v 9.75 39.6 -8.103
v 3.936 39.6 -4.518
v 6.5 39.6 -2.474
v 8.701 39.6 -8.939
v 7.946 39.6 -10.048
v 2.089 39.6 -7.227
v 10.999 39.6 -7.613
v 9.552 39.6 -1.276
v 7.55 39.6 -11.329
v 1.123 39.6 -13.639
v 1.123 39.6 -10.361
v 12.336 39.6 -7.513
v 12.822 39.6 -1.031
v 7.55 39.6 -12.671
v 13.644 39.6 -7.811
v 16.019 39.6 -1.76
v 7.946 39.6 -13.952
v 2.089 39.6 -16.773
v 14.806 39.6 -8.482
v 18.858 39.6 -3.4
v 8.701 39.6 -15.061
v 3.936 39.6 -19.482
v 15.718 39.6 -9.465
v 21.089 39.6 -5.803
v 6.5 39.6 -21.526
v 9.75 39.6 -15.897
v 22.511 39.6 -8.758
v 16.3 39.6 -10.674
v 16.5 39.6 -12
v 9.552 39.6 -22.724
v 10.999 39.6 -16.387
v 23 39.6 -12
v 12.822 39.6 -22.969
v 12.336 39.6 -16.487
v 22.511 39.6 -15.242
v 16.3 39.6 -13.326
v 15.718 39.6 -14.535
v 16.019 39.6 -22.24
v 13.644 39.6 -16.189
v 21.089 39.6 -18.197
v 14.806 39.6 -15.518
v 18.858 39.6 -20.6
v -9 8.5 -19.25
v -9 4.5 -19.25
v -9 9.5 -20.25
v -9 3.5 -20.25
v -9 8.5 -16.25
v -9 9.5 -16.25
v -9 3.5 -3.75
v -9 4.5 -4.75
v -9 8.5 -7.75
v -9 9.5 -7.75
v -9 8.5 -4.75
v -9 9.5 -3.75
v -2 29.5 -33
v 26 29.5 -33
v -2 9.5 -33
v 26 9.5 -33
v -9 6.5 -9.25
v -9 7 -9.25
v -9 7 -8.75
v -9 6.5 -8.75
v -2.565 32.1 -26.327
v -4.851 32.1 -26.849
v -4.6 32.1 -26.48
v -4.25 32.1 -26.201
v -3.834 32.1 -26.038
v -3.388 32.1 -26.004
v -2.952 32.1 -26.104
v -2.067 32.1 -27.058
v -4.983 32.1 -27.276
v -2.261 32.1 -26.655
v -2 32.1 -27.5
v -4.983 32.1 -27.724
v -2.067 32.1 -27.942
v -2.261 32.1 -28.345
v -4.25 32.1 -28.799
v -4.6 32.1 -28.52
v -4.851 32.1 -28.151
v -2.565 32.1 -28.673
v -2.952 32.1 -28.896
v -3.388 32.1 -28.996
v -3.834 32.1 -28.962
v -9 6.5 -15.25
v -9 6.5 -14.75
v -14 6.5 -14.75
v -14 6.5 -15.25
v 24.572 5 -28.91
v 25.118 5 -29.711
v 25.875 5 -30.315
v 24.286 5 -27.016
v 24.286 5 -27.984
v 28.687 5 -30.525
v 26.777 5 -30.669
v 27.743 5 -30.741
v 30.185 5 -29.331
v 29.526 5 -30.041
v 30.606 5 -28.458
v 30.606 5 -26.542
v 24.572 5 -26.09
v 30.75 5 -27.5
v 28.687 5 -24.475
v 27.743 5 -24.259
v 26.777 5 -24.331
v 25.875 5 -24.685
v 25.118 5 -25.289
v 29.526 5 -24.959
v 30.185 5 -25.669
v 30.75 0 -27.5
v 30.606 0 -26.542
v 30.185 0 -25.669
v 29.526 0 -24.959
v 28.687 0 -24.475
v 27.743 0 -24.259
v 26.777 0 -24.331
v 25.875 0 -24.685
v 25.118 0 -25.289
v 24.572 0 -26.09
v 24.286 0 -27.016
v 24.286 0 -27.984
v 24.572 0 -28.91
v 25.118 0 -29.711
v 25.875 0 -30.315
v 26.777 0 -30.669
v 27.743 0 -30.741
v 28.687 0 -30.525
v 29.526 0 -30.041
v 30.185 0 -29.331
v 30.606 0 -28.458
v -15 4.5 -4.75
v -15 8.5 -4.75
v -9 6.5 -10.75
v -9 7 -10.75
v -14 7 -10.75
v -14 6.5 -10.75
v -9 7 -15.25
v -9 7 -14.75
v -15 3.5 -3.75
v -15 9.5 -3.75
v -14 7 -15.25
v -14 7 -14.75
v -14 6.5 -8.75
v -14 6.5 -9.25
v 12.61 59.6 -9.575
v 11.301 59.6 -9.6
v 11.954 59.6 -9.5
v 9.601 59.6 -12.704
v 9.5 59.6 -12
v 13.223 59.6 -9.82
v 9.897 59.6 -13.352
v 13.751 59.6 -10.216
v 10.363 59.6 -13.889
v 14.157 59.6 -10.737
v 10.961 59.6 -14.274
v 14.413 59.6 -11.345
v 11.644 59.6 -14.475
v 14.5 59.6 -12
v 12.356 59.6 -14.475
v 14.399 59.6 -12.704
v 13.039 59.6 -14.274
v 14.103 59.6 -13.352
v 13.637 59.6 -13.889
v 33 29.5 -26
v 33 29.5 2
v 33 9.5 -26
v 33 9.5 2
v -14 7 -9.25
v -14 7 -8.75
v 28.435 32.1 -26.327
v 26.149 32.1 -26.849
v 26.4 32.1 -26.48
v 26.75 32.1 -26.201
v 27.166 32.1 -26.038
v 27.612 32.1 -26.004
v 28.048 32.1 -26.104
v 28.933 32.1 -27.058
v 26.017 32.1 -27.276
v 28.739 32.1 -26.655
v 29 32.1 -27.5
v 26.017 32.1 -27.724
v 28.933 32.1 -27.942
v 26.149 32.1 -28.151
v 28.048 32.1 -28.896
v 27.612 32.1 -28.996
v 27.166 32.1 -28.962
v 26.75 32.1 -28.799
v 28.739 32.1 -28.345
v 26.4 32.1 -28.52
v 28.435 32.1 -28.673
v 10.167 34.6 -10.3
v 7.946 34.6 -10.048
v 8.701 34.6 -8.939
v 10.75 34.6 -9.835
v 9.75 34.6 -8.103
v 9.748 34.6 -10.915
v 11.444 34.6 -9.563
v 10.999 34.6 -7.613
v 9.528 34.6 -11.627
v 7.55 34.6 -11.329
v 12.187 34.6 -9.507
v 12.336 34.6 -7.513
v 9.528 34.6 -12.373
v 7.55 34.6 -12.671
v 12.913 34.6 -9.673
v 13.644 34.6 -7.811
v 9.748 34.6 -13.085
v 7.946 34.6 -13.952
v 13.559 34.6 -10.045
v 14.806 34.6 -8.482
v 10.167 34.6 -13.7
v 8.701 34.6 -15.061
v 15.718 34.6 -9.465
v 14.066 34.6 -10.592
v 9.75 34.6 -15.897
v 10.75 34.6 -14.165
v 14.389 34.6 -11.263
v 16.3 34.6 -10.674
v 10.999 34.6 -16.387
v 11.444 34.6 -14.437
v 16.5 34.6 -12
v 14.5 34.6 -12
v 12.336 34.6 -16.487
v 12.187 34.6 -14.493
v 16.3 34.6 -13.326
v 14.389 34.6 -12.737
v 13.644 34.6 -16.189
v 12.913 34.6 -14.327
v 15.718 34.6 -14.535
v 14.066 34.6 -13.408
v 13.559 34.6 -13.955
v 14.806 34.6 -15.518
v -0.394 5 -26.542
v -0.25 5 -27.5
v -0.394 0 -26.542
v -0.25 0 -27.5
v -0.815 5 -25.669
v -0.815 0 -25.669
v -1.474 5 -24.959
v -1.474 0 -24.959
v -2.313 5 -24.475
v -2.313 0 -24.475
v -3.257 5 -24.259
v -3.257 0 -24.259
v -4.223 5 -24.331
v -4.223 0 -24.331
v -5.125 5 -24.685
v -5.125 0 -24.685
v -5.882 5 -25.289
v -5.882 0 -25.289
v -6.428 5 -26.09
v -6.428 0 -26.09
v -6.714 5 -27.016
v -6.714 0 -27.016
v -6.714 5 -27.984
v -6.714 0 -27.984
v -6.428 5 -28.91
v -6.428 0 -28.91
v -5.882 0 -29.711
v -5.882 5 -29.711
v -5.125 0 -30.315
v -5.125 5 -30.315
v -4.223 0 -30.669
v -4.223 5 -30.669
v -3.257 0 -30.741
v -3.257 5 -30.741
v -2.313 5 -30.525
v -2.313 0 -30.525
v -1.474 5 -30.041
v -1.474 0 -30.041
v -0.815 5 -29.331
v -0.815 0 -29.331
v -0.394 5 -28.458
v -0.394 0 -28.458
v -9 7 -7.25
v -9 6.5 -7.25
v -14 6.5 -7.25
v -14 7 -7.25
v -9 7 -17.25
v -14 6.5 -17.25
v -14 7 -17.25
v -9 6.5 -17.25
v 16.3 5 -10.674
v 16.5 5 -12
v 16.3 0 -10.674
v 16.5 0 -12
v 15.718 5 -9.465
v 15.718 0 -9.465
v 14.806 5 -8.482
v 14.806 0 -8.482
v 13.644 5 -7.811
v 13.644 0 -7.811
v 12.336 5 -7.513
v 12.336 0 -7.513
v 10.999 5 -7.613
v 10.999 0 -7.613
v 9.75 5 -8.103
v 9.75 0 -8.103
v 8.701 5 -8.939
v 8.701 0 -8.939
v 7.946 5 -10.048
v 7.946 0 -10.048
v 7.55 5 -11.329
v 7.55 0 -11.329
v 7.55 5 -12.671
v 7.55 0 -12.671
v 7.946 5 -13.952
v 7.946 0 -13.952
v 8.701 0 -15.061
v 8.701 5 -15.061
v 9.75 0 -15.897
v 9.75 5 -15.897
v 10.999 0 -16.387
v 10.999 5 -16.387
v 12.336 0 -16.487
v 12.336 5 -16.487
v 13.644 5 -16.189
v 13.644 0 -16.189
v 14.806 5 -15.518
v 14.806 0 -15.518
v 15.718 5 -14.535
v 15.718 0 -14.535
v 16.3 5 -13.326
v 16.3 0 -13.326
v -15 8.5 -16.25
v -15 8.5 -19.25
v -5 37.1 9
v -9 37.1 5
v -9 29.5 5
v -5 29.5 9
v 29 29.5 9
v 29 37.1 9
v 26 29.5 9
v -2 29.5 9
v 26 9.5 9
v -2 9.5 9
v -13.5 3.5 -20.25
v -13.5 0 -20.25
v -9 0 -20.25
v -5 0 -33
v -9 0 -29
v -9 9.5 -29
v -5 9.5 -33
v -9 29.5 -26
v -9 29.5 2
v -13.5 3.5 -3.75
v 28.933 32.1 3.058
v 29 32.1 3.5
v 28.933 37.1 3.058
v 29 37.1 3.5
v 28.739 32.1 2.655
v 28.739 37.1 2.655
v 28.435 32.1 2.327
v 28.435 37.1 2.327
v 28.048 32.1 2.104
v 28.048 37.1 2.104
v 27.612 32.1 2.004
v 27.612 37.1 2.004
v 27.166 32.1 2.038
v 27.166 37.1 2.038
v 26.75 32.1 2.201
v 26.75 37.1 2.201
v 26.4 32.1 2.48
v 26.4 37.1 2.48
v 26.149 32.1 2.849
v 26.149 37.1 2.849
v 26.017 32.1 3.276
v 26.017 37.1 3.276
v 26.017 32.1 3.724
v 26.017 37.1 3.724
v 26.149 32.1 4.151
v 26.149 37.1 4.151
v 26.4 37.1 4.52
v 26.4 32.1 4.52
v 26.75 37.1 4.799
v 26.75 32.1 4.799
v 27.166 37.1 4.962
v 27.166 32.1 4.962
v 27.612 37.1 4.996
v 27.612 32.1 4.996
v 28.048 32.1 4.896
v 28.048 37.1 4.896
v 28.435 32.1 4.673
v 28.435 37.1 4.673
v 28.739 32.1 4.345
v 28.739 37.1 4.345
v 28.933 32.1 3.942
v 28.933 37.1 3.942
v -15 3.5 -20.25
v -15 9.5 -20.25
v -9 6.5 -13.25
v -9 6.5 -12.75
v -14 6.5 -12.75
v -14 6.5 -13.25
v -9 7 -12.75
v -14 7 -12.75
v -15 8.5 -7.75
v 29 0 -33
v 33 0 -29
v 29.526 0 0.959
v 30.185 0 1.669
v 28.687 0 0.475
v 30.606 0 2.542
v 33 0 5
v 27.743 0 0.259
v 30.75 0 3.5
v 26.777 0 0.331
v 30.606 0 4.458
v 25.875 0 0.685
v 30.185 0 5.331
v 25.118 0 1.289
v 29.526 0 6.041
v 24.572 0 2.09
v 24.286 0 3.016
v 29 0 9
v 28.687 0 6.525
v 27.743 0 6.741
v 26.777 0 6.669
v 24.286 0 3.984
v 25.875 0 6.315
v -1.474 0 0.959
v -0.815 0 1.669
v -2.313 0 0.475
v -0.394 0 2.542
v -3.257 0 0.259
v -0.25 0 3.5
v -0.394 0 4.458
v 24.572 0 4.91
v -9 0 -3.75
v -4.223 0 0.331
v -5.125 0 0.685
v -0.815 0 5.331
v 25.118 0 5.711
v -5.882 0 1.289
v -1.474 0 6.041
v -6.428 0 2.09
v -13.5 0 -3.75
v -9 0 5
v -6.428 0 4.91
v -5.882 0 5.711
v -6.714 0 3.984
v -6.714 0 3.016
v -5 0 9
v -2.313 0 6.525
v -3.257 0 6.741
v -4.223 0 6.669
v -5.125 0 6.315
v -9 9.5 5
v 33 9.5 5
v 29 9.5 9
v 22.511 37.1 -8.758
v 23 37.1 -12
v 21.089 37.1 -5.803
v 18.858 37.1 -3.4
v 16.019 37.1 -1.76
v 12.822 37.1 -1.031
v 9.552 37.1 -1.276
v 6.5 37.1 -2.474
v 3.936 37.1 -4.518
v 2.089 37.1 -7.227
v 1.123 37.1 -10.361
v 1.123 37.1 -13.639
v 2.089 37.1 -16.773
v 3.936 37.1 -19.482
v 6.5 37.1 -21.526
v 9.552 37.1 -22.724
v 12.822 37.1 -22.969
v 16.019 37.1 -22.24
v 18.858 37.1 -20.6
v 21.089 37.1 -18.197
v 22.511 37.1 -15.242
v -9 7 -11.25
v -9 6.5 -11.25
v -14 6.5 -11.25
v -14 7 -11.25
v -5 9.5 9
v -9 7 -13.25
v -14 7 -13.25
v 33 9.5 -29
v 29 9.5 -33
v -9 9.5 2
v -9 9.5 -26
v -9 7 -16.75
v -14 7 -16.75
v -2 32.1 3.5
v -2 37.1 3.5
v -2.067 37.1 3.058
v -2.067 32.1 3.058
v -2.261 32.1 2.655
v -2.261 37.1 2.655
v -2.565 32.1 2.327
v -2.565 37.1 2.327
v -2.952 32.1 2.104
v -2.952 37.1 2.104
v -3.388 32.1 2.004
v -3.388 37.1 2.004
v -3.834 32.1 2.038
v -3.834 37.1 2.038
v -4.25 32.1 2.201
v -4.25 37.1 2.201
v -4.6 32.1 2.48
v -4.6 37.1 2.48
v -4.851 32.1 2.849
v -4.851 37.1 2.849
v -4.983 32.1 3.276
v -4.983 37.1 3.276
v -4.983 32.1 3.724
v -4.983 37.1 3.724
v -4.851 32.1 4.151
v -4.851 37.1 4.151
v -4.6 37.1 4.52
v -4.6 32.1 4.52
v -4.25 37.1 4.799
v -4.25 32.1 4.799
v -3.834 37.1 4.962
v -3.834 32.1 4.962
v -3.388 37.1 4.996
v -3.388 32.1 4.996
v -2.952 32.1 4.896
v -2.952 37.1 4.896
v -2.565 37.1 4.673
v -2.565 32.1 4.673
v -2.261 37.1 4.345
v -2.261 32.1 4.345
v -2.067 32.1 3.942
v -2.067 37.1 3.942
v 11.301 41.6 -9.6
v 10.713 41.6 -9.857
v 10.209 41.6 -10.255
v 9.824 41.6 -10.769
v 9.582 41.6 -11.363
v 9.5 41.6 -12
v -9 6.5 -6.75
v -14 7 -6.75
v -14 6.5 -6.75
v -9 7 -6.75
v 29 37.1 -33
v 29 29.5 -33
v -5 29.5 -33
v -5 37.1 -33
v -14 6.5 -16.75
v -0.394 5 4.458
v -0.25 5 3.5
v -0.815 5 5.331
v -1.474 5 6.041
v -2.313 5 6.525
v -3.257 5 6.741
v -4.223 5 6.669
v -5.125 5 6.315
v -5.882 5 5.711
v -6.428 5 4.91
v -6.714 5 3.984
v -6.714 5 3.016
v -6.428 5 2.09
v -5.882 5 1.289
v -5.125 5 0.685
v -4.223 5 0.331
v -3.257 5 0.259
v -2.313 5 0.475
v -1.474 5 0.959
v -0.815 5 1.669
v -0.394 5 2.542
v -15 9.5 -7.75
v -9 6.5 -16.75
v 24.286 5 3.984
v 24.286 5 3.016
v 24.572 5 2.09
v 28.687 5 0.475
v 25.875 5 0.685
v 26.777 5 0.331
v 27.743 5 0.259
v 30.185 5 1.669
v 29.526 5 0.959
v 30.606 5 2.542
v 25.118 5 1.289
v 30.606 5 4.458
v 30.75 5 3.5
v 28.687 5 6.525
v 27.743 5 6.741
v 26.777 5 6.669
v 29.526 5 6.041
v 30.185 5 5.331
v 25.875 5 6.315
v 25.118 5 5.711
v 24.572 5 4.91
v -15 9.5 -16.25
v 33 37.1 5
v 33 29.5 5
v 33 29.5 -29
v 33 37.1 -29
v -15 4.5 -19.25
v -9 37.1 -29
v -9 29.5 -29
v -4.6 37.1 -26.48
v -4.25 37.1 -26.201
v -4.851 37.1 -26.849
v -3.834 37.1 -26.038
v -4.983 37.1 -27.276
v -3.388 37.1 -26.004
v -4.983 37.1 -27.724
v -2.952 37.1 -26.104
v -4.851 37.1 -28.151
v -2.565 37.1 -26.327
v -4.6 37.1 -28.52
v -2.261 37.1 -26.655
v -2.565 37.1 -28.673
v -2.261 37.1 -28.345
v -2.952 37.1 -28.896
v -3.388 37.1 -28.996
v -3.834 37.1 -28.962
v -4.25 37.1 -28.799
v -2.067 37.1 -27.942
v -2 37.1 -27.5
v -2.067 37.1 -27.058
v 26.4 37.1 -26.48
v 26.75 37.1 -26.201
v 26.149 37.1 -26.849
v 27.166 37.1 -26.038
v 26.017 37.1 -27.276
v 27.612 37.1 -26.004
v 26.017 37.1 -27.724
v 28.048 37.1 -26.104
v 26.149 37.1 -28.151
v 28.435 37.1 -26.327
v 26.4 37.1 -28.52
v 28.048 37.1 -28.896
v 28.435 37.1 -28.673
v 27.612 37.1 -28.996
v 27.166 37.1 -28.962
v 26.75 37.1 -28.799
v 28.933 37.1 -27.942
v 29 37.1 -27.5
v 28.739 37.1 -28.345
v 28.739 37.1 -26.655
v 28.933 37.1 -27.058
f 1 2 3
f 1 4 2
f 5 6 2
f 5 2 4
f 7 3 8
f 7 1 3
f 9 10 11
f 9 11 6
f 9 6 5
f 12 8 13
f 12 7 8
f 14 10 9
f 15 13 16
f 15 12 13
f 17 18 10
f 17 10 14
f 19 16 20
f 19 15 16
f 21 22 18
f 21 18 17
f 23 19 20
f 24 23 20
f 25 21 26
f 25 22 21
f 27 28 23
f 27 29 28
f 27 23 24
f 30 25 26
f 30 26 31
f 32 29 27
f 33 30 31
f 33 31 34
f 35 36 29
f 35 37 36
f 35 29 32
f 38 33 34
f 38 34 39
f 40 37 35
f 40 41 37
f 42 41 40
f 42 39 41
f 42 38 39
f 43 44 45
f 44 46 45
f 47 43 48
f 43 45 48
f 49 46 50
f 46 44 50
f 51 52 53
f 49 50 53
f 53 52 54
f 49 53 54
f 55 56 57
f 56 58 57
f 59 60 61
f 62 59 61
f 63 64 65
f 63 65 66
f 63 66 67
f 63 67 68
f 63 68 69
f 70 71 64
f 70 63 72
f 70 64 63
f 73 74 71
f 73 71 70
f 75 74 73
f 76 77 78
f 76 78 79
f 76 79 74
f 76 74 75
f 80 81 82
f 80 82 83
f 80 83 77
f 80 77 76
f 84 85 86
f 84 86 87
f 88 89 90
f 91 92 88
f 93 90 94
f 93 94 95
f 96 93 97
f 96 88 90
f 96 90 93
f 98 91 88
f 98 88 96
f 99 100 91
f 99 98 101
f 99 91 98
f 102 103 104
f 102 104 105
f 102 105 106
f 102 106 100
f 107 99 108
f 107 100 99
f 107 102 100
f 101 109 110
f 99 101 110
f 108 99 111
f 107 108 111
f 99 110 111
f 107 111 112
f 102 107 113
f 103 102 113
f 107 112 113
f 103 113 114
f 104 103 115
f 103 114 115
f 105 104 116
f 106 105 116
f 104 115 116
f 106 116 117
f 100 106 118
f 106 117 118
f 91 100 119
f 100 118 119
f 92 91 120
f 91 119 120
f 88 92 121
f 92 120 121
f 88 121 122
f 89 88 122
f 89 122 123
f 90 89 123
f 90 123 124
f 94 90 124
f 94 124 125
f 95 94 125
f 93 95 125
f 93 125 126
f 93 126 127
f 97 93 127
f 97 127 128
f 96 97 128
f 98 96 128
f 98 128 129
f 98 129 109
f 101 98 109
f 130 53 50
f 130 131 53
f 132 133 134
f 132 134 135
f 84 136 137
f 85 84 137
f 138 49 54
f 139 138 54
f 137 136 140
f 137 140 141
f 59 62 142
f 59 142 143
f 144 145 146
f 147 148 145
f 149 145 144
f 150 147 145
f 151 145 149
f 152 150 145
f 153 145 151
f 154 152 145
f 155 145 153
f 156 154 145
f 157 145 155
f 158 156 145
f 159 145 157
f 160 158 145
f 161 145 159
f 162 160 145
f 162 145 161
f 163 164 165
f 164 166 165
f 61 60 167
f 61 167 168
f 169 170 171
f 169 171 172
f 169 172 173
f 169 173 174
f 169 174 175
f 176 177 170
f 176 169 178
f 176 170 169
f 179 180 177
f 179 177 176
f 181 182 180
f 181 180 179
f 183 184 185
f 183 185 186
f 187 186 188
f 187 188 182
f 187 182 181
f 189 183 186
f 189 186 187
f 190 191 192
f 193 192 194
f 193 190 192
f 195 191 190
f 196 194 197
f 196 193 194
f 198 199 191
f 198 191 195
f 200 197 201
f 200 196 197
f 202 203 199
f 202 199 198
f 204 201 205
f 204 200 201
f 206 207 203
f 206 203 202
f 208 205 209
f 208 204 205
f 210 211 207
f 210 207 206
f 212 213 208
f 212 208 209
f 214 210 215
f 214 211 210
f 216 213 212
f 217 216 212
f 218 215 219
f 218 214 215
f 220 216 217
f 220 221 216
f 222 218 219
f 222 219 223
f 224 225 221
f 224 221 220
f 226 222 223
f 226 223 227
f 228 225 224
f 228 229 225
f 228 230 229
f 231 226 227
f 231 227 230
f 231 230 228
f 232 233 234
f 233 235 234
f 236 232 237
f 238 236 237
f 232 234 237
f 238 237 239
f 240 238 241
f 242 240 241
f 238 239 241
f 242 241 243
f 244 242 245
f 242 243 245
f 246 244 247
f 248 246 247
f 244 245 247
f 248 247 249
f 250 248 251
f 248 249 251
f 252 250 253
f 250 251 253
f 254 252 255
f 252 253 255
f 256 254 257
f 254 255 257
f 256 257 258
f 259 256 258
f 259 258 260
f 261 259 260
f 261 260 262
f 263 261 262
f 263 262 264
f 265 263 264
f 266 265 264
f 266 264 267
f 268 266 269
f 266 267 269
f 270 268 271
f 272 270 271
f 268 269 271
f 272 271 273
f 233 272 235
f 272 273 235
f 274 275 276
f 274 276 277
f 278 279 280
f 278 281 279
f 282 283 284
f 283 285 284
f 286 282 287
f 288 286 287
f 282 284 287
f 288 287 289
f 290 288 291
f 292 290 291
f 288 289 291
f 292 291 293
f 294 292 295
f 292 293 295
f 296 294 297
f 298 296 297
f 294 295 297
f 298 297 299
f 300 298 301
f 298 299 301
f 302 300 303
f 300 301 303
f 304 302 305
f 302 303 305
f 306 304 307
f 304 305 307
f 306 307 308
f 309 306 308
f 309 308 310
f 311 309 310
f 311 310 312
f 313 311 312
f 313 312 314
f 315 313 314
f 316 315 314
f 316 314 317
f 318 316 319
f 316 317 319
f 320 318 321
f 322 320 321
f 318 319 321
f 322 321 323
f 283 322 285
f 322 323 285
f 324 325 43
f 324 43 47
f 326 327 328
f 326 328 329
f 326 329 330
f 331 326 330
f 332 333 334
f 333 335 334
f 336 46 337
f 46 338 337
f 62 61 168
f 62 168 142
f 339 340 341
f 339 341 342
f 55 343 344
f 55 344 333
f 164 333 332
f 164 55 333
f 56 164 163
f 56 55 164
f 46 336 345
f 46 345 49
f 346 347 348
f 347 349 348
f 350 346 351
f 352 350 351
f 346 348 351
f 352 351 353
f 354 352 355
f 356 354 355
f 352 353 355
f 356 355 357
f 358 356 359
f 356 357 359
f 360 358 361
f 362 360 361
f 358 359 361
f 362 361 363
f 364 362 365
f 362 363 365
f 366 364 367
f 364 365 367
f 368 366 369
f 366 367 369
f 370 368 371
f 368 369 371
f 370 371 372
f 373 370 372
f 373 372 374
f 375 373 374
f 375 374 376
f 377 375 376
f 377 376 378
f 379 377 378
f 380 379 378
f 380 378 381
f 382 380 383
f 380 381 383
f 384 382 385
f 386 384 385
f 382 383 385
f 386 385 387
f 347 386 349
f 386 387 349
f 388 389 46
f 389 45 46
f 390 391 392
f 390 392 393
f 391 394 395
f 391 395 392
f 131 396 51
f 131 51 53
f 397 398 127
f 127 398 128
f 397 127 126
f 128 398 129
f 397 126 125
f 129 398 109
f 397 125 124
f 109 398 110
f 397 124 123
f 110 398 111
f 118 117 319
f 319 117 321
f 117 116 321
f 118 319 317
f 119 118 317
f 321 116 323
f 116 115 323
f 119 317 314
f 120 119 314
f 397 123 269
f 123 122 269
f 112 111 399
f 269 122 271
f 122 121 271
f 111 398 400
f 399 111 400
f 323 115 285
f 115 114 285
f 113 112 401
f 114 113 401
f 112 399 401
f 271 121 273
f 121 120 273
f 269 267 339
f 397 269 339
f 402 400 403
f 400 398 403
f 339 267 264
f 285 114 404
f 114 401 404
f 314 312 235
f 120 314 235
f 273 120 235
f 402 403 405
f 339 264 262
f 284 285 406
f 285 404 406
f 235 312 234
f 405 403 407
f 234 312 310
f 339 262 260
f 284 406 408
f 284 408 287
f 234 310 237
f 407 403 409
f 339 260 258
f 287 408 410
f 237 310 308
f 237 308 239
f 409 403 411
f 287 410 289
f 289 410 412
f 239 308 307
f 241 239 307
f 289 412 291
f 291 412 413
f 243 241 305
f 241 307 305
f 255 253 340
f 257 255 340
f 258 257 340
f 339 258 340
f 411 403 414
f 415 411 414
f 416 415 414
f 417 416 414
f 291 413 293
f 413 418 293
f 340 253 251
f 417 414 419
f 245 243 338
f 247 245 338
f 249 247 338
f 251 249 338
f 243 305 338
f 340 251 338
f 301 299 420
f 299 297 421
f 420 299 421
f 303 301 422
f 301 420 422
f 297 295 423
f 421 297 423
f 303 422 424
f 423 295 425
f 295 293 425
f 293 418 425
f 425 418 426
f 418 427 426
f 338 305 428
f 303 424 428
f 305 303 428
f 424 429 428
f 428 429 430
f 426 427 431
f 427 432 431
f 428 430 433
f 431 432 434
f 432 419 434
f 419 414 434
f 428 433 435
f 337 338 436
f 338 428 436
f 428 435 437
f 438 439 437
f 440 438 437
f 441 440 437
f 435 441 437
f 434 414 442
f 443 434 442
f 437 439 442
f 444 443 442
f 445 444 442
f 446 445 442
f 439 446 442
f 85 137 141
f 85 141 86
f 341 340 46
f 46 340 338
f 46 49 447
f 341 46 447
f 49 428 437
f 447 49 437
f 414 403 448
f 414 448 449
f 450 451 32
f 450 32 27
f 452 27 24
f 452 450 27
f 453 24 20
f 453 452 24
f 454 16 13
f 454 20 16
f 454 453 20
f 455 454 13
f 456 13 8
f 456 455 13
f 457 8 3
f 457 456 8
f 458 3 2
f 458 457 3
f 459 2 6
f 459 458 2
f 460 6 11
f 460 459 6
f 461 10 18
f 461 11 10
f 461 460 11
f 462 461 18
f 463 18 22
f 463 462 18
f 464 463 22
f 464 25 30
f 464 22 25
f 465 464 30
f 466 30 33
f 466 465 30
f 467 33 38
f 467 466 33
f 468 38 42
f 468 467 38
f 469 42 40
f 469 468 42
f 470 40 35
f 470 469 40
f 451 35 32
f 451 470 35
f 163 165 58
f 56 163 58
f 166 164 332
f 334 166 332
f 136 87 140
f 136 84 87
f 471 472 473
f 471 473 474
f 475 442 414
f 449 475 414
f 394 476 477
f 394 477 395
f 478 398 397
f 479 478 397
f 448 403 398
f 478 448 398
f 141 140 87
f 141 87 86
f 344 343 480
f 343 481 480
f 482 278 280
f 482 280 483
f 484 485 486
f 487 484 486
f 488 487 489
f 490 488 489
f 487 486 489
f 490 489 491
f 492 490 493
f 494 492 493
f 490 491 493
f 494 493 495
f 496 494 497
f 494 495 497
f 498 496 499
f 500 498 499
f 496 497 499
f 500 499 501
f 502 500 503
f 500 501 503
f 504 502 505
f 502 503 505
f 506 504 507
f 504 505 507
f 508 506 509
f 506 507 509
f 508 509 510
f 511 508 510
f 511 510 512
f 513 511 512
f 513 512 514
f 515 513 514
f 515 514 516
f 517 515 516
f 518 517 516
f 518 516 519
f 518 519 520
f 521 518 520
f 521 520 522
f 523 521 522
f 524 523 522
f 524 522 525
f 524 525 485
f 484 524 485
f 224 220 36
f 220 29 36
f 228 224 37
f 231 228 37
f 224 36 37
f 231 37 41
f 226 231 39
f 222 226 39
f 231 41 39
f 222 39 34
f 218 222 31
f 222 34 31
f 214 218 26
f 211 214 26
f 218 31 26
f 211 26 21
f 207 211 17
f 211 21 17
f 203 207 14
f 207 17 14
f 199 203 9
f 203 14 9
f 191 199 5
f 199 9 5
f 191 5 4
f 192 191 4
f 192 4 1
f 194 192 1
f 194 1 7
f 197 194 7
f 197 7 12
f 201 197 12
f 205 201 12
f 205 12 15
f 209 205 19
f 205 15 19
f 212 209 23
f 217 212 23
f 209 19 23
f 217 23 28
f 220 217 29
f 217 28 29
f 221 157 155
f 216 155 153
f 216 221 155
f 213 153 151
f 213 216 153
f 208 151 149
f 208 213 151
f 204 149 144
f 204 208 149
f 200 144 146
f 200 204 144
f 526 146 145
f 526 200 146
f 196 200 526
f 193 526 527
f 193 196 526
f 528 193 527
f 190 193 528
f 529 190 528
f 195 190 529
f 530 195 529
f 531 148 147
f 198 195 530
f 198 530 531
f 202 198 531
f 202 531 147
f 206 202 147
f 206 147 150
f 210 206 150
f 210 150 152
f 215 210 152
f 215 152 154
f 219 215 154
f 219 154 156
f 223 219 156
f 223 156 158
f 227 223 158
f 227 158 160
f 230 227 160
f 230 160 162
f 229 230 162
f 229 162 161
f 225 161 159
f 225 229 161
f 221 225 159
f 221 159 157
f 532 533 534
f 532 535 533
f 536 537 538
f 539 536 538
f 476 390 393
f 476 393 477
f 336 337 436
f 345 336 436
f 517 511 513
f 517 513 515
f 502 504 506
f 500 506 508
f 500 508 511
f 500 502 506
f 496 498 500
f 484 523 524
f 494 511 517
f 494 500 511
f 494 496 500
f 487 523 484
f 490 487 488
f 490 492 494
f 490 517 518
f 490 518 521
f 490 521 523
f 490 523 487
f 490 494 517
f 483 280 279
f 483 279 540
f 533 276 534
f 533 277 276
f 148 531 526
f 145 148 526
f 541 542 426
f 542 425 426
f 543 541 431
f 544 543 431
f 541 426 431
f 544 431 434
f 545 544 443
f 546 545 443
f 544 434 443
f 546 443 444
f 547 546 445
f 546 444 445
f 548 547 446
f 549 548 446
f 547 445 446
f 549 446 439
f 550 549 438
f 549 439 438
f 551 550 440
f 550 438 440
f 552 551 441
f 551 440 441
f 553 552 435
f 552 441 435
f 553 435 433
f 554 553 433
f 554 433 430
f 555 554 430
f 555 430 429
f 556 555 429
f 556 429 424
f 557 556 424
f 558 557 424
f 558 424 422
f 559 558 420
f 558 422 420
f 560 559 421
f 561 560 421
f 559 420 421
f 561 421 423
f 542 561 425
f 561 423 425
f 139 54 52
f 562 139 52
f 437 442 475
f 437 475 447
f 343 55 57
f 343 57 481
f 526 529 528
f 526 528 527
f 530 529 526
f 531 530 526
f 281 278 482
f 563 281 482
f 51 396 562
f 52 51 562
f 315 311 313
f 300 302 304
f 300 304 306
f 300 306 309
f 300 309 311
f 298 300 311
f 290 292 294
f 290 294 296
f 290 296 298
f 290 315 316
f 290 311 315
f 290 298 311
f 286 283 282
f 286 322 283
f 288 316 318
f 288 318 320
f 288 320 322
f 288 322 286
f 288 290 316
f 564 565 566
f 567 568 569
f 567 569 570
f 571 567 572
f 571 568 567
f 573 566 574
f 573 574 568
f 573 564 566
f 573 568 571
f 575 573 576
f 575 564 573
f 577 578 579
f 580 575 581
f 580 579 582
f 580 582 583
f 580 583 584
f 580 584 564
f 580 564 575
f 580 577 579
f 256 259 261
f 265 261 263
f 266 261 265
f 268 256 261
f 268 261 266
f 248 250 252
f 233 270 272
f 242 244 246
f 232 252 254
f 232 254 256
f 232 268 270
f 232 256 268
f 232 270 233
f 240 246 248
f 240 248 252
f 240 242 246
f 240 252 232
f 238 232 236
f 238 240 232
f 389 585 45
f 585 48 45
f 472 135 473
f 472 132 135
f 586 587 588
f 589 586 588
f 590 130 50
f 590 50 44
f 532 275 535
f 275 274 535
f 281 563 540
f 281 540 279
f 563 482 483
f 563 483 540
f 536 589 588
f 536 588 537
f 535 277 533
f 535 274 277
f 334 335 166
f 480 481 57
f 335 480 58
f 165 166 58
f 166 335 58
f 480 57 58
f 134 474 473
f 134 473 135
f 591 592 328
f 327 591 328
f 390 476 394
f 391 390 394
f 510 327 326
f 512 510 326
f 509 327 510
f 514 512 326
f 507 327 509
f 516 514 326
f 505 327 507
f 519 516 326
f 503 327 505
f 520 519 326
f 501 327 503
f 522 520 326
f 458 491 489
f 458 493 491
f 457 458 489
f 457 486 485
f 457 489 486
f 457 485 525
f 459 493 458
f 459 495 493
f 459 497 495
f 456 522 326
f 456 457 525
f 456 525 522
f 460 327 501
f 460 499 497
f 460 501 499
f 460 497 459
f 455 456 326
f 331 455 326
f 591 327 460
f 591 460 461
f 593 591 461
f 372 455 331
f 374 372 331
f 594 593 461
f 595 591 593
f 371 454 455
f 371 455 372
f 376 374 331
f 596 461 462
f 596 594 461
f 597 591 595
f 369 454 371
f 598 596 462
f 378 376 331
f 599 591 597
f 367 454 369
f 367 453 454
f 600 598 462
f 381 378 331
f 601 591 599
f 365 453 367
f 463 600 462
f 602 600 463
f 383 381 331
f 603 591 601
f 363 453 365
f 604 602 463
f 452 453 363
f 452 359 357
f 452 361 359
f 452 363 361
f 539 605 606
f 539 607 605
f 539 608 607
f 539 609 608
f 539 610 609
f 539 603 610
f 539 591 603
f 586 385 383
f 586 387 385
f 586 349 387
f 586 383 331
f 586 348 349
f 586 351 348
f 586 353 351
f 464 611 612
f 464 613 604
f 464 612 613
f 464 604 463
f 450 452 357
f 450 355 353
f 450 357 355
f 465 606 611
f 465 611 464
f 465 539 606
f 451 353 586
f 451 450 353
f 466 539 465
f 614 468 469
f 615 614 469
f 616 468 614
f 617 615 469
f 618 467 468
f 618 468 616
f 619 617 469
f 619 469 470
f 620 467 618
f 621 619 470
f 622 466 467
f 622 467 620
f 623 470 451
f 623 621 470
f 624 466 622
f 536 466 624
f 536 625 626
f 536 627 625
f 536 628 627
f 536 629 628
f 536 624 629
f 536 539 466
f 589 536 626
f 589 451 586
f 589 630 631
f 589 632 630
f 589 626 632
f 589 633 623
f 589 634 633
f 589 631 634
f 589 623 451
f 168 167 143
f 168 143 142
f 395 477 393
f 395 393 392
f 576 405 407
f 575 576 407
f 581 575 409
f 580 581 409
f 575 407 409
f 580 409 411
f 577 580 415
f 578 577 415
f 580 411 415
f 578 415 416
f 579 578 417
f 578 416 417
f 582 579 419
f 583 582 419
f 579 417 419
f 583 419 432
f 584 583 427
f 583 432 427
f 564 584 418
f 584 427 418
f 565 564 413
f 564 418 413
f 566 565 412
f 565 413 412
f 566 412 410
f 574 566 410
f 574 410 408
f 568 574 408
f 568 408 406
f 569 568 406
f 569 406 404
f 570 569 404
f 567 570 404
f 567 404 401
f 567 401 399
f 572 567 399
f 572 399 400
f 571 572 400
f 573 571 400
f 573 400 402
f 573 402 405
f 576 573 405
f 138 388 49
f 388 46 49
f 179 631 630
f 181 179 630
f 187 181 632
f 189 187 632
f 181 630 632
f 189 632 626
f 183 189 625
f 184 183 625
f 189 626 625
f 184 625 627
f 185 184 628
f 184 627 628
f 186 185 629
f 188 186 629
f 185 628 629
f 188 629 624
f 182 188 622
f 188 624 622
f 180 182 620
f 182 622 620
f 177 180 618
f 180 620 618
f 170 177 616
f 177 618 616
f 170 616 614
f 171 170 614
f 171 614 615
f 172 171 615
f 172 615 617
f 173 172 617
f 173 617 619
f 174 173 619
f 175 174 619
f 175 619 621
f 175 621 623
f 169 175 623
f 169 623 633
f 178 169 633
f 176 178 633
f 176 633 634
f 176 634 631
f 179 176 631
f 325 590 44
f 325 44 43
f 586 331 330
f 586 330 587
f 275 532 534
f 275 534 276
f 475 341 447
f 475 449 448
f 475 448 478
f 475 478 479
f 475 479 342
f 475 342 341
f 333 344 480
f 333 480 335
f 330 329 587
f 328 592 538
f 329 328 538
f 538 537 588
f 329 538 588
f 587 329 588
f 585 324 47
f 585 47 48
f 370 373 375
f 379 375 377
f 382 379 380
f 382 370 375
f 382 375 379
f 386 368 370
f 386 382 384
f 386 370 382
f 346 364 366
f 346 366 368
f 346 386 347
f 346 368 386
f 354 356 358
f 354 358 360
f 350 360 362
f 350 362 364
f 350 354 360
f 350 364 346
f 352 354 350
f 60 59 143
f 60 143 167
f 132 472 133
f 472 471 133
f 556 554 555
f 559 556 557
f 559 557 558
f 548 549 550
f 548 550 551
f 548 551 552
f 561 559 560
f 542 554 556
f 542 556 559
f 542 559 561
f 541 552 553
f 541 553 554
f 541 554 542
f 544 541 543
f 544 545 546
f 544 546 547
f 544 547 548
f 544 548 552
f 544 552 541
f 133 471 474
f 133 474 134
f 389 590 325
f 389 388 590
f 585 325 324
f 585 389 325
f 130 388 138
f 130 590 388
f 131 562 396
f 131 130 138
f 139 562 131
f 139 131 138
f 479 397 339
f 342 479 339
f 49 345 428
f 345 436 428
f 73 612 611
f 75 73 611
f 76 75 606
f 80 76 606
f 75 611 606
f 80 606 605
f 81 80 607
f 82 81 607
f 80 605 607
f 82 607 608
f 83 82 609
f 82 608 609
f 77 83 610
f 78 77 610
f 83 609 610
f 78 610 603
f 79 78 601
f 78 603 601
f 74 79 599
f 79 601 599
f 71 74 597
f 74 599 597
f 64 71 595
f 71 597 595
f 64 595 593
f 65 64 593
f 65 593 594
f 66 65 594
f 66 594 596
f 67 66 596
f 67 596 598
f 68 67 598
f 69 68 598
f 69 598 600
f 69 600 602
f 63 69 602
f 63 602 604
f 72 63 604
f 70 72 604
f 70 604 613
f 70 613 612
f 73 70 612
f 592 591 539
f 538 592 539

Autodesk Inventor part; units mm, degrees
ref_plane "YZ Plane" through (0, 0, 0) normal (1, 0, 0) x (0, 1, 0)
ref_plane "XZ Plane" through (0, 0, 0) normal (0, 1, 0) x (-1, 0, 0)
ref_plane "XY Plane" through (0, 0, 0) normal (0, 0, 1) x (1, 0, 0)
sketch "Эскиз1" plane through (0, 0, 0) normal (0, 1, 0) x (-1, 0, 0)
  line L0 (9, 9) -> (-33, 9)
  line L1 (-33, 9) -> (-33, -33)
  line L2 (-33, -33) -> (9, -33)
  line L3 (9, -33) -> (9, 9)
  line L4 (9, -29) -> (5, -33)
  line L5 (9, 9) -> (-33, -33) construction
  line L6 (9, -33) -> (-33, 9) construction
  line L7 (5, 9) -> (9, 5)
  line L8 (-33, 5) -> (-29, 9)
  line L9 (-33, -29) -> (-29, -33)
  line L10 (13.5, -3.75) -> (9, -3.75)
  line L11 (9, -20.25) -> (13.5, -20.25)
  line L12 (13.5, -20.25) -> (13.5, -3.75)
  point P0 (0, 0)
  dimension "d0" = 42
  dimension "d1" = 42
  dimension "d2" = 4
  dimension "d3" = 4
  dimension "d17" = 12.75
  dimension "d18" = 16.5
  dimension "d19" = 4.5
extrude "Выдавливание1" add sketch "Эскиз1" along normal blind 9.5 contours L7 L3 L4 L2 L9 L1 L8 L0 | L10 L12 L11 L3
sketch "Эскиз2" plane through (0, 0, 0) normal (0, -1, 0) x (1, 0, 0)
  line L0 (-9, -33) -> (33, -33)
  line L1 (33, -33) -> (33, 9)
  line L2 (33, 9) -> (-9, 9)
  line L3 (-9, 9) -> (-9, -33)
  line L4 (-9, -33) -> (33, 9) construction
  line L5 (33, -33) -> (-9, 9) construction
  circle A0 centre (12, -12) radius 4.5
  circle A1 centre (-3.5, -27.5) radius 3.25
  circle A2 centre (-3.5, 3.5) radius 3.25
  circle A3 centre (27.5, 3.5) radius 3.25
  circle A4 centre (27.5, -27.5) radius 3.25
  line L6 (33, 5) -> (33, -29) projected
  line L7 (-5, 9) -> (29, 9) projected
  line L8 (29, -33) -> (-5, -33) projected
  line L9 (-9, -3.75) -> (-9, 5) projected
  point P0 (0, 0)
  dimension "d22" = 9
  dimension "d23" = 6.5
  dimension "d25" = 5.5
  dimension "d28" = 360
extrude "Выдавливание2" cut sketch "Эскиз2" against normal blind 5 contours A0 | A1 | A2 | A3 | A4
sketch "Эскиз3" plane through (0, 9.5, 0) normal (0, 1, 0) x (1, 0, 0)
  line L0 (-13.5, 3.75) -> (-9, 3.75) projected
  line L1 (-13.5, 3.75) -> (-9, 3.75)
  line L2 (-9, 3.75) -> (-9, 20.25)
  line L3 (-9, 20.25) -> (-13.5, 20.25)
  line L4 (-13.5, 20.25) -> (-13.5, 3.75)
  point P0 (0, 0)
extrude "Выдавливание3" cut sketch "Эскиз3" against normal blind 6
sketch "Эскиз4" plane through (-9, 0, -29) normal (-1, 0, 0) x (0, 0, 1)
  line L0 (8.75, 3.5) -> (25.25, 3.5) projected
  line L1 (8.75, 3.5) -> (25.25, 3.5)
  line L2 (25.25, 3.5) -> (25.25, 9.5)
  line L3 (25.25, 9.5) -> (8.75, 9.5)
  line L4 (8.75, 9.5) -> (8.75, 3.5)
  point P0 (29, 0)
  dimension "d34" = 16.5
  dimension "d35" = 6
extrude "Выдавливание4" add sketch "Эскиз4" along normal blind 6 separate body
sketch "Эскиз5" plane through (-15, 0, -29) normal (-1, 0, 0) x (0, 0, 1)
  line L0 (25.25, 9.5) -> (8.75, 9.5) projected
  line L1 (25.25, 3.5) -> (8.75, 3.5) projected
  line L2 (8.75, 9.5) -> (25.25, 9.5)
  line L3 (25.25, 9.5) -> (25.25, 3.5)
  line L4 (25.25, 3.5) -> (8.75, 3.5)
  line L5 (8.75, 3.5) -> (8.75, 9.5)
  line L6 (9.75, 8.5) -> (12.75, 8.5)
  line L7 (24.25, 8.5) -> (24.25, 4.5)
  line L8 (24.25, 4.5) -> (9.75, 4.5)
  line L9 (9.75, 4.5) -> (9.75, 8.5)
  line L10 (12.75, 8.5) -> (12.75, 9.5)
  line L11 (21.25, 8.5) -> (21.25, 9.5)
  line L12 (0, 9.5) -> (34, 9.5) projected
  line L13 (21.25, 8.5) -> (24.25, 8.5)
  point P0 (29, 0)
  dimension "d38" = 1
  dimension "d39" = 4
  dimension "d40" = 4
extrude "Выдавливание5" cut sketch "Эскиз5" against normal blind 6 contours L11 L13 L7 L8 L9 L6 L10 L0 bodies 2
sketch "Эскиз6" plane through (-9, 0, -29) normal (-1, 0, 0) x (0, 0, 1)
  line L0 (11.75, 7) -> (12.25, 7)
  line L1 (12.25, 7) -> (12.25, 6.5)
  line L2 (12.25, 6.5) -> (11.75, 6.5)
  line L3 (11.75, 6.5) -> (11.75, 7)
  line L4 (13.75, 7) -> (14.25, 7)
  line L5 (14.25, 7) -> (14.25, 6.5)
  line L6 (14.25, 6.5) -> (13.75, 6.5)
  line L7 (13.75, 6.5) -> (13.75, 7)
  line L8 (15.75, 7) -> (16.25, 7)
  line L9 (16.25, 7) -> (16.25, 6.5)
  line L10 (16.25, 6.5) -> (15.75, 6.5)
  line L11 (15.75, 6.5) -> (15.75, 7)
  line L12 (17.75, 7) -> (18.25, 7)
  line L13 (18.25, 7) -> (18.25, 6.5)
  line L14 (18.25, 6.5) -> (17.75, 6.5)
  line L15 (17.75, 6.5) -> (17.75, 7)
  line L16 (19.75, 7) -> (20.25, 7)
  line L17 (20.25, 7) -> (20.25, 6.5)
  line L18 (20.25, 6.5) -> (19.75, 6.5)
  line L19 (19.75, 6.5) -> (19.75, 7)
  line L20 (21.75, 7) -> (22.25, 7)
  line L21 (22.25, 7) -> (22.25, 6.5)
  line L22 (22.25, 6.5) -> (21.75, 6.5)
  line L23 (21.75, 6.5) -> (21.75, 7)
  line L24 (8.75, 0) -> (8.75, 3.5) projected
  point P0 (29, 0)
  dimension "d43" = 0.5
  dimension "d44" = 0.5
  dimension "d47" = 2
  dimension "d52" = 3
extrude "Выдавливание6" add sketch "Эскиз6" along normal blind 5 separate body
sketch "Эскиз7" plane through (0, 9.5, 0) normal (0, 1, 0) x (1, 0, 0)
  line L0 (33, 33) -> (-9, 33)
  line L1 (-9, 33) -> (-9, -9)
  line L2 (-9, -9) -> (33, -9)
  line L3 (33, -9) -> (33, 33)
  line L4 (33, -2) -> (26, -9)
  line L5 (33, -5) -> (33, 29) projected
  line L6 (-5, -9) -> (29, -9) projected
  line L7 (-9, 29) -> (-9, -5) projected
  line L8 (-9, -2) -> (-2, -9)
  line L9 (-2, 33) -> (-9, 26)
  line L10 (33, 26) -> (26, 33)
  line L11 (29, 33) -> (-5, 33) projected
  point P0 (0, 0)
  point P1 (33, 12)
  point P2 (12, -9)
  point P3 (-2, -9)
  dimension "d56" = 7
  dimension "d57" = 42
  dimension "d58" = 42
  dimension "d59" = 7
extrude "Выдавливание7" add sketch "Эскиз7" along normal blind 20 separate body contours L10 L3 L4 L2 L8 L1 L9 L0
sketch "Эскиз8" plane through (0, 29.5, 0) normal (0, 1, 0) x (1, 0, 0)
  line L0 (33, 33) -> (-9, 33)
  line L1 (-9, 33) -> (-9, -9)
  line L2 (-9, -9) -> (33, -9)
  line L3 (33, -9) -> (33, 33)
  line L4 (33, 29) -> (29, 33)
  line L5 (29, -9) -> (33, -5)
  line L6 (-9, -5) -> (-5, -9)
  line L7 (-9, 29) -> (-5, 33)
  point P0 (0, 0)
  dimension "d62" = 42
  dimension "d63" = 42
  dimension "d64" = 4
  dimension "d65" = 4
extrude "Выдавливание8" add sketch "Эскиз8" along normal blind 7.6 contours L4 L3 L5 L2 L6 L1 L7 L0 bodies 1
sketch "Эскиз9" plane through (0, 37.1, 0) normal (0, 1, 0) x (1, 0, 0)
  line L0 (33, -9) -> (-9, -9)
  line L1 (-9, -9) -> (-9, 33)
  line L2 (-9, 33) -> (33, 33)
  line L3 (33, 33) -> (33, -9)
  line L4 (33, -9) -> (-9, 33) construction
  line L5 (-9, -9) -> (33, 33) construction
  circle A0 centre (12, 12) radius 11
  point P0 (0, 0)
  dimension "d68" = 42
  dimension "d69" = 42
  dimension "d70" = 22
extrude "Выдавливание9" add sketch "Эскиз9" along normal blind 2.5 contours A0 bodies 1
sketch "Эскиз10" plane through (12, 39.6, -12) normal (0, 1, 0) x (1, 0, 0)
  circle A0 centre (0, 0) radius 11 projected
  circle A1 centre (0, 0) radius 4.5
  point P0 (-12, -12)
  dimension "d73" = 9
extrude "Выдавливание10" cut sketch "Эскиз10" against normal blind 5 contours A1 bodies 1
sketch "Эскиз11" plane through (12, 34.6, -12) normal (0, 1, 0) x (1, 0, 0)
  circle A0 centre (0, 0) radius 4.5 projected
  circle A1 centre (0, 0) radius 2.5
  point P0 (-12, -12)
  dimension "d76" = 5
extrude "Выдавливание11" add sketch "Эскиз11" along normal blind 25 contours A1 bodies 1
sketch "Эскиз12" plane through (12, 59.6, -12) normal (0, 1, 0) x (1, 0, 0)
  circle A0 centre (0, 0) radius 2.5 projected
  line L0 (-2.5, 0) -> (-0.6992, -2.4002)
  circle A1 centre (0, 0) radius 2.5
  point P0 (-12, -12)
extrude "Выдавливание12" cut sketch "Эскиз12" against normal blind 18 contours L0 A0 picked at (-1.8806, -0.9775) bodies 1
sketch "Эскиз13" plane through (0, 37.1, 0) normal (0, 1, 0) x (1, 0, 0)
  line L0 (-9, -9) -> (33, -9)
  line L1 (33, -9) -> (33, 33)
  line L2 (33, 33) -> (-9, 33)
  line L3 (-9, 33) -> (-9, -9)
  circle A0 centre (27.5, 27.5) radius 1.5
  circle A1 centre (-3.5, -3.5) radius 1.5
  line L4 (-9, 29) -> (-9, -5) projected
  line L5 (-9, 27.5) -> (33, 27.5) construction
  line L6 (33, -5) -> (33, 29) projected
  line L7 (29, 33) -> (-5, 33) projected
  line L8 (27.5, 33) -> (27.5, -9) construction
  line L9 (-5, -9) -> (29, -9) projected
  line L10 (-9, -3.5) -> (33, -3.5) construction
  line L11 (33, -5) -> (33, 29) projected
  line L12 (-3.5, -9) -> (-3.5, 33) construction
  line L13 (29, 33) -> (-5, 33) projected
  circle A2 centre (-3.5, 27.5) radius 1.5
  circle A3 centre (27.5, -3.5) radius 1.5
  point P0 (0, 0)
  dimension "d81" = 42
  dimension "d82" = 42
  dimension "d85" = 3
  dimension "d86" = 3
  dimension "d89" = 5.5
  dimension "d90" = 5.5
  dimension "d91" = 5.5
  dimension "d92" = 5.5
  dimension "d93" = 3
  dimension "d94" = 3
extrude "Выдавливание13" cut sketch "Эскиз13" against normal blind 5 contours A0 | A1 | A2 | A3 bodies 1
equation "\"d85\" = d93"
equation "\"d86\" = d93"
equation "\"d90\" = d89"
equation "\"d91\" = d89"
equation "\"d92\" = d89"
equation "\"d94\" = d93"
properties part number "Nema-17"
